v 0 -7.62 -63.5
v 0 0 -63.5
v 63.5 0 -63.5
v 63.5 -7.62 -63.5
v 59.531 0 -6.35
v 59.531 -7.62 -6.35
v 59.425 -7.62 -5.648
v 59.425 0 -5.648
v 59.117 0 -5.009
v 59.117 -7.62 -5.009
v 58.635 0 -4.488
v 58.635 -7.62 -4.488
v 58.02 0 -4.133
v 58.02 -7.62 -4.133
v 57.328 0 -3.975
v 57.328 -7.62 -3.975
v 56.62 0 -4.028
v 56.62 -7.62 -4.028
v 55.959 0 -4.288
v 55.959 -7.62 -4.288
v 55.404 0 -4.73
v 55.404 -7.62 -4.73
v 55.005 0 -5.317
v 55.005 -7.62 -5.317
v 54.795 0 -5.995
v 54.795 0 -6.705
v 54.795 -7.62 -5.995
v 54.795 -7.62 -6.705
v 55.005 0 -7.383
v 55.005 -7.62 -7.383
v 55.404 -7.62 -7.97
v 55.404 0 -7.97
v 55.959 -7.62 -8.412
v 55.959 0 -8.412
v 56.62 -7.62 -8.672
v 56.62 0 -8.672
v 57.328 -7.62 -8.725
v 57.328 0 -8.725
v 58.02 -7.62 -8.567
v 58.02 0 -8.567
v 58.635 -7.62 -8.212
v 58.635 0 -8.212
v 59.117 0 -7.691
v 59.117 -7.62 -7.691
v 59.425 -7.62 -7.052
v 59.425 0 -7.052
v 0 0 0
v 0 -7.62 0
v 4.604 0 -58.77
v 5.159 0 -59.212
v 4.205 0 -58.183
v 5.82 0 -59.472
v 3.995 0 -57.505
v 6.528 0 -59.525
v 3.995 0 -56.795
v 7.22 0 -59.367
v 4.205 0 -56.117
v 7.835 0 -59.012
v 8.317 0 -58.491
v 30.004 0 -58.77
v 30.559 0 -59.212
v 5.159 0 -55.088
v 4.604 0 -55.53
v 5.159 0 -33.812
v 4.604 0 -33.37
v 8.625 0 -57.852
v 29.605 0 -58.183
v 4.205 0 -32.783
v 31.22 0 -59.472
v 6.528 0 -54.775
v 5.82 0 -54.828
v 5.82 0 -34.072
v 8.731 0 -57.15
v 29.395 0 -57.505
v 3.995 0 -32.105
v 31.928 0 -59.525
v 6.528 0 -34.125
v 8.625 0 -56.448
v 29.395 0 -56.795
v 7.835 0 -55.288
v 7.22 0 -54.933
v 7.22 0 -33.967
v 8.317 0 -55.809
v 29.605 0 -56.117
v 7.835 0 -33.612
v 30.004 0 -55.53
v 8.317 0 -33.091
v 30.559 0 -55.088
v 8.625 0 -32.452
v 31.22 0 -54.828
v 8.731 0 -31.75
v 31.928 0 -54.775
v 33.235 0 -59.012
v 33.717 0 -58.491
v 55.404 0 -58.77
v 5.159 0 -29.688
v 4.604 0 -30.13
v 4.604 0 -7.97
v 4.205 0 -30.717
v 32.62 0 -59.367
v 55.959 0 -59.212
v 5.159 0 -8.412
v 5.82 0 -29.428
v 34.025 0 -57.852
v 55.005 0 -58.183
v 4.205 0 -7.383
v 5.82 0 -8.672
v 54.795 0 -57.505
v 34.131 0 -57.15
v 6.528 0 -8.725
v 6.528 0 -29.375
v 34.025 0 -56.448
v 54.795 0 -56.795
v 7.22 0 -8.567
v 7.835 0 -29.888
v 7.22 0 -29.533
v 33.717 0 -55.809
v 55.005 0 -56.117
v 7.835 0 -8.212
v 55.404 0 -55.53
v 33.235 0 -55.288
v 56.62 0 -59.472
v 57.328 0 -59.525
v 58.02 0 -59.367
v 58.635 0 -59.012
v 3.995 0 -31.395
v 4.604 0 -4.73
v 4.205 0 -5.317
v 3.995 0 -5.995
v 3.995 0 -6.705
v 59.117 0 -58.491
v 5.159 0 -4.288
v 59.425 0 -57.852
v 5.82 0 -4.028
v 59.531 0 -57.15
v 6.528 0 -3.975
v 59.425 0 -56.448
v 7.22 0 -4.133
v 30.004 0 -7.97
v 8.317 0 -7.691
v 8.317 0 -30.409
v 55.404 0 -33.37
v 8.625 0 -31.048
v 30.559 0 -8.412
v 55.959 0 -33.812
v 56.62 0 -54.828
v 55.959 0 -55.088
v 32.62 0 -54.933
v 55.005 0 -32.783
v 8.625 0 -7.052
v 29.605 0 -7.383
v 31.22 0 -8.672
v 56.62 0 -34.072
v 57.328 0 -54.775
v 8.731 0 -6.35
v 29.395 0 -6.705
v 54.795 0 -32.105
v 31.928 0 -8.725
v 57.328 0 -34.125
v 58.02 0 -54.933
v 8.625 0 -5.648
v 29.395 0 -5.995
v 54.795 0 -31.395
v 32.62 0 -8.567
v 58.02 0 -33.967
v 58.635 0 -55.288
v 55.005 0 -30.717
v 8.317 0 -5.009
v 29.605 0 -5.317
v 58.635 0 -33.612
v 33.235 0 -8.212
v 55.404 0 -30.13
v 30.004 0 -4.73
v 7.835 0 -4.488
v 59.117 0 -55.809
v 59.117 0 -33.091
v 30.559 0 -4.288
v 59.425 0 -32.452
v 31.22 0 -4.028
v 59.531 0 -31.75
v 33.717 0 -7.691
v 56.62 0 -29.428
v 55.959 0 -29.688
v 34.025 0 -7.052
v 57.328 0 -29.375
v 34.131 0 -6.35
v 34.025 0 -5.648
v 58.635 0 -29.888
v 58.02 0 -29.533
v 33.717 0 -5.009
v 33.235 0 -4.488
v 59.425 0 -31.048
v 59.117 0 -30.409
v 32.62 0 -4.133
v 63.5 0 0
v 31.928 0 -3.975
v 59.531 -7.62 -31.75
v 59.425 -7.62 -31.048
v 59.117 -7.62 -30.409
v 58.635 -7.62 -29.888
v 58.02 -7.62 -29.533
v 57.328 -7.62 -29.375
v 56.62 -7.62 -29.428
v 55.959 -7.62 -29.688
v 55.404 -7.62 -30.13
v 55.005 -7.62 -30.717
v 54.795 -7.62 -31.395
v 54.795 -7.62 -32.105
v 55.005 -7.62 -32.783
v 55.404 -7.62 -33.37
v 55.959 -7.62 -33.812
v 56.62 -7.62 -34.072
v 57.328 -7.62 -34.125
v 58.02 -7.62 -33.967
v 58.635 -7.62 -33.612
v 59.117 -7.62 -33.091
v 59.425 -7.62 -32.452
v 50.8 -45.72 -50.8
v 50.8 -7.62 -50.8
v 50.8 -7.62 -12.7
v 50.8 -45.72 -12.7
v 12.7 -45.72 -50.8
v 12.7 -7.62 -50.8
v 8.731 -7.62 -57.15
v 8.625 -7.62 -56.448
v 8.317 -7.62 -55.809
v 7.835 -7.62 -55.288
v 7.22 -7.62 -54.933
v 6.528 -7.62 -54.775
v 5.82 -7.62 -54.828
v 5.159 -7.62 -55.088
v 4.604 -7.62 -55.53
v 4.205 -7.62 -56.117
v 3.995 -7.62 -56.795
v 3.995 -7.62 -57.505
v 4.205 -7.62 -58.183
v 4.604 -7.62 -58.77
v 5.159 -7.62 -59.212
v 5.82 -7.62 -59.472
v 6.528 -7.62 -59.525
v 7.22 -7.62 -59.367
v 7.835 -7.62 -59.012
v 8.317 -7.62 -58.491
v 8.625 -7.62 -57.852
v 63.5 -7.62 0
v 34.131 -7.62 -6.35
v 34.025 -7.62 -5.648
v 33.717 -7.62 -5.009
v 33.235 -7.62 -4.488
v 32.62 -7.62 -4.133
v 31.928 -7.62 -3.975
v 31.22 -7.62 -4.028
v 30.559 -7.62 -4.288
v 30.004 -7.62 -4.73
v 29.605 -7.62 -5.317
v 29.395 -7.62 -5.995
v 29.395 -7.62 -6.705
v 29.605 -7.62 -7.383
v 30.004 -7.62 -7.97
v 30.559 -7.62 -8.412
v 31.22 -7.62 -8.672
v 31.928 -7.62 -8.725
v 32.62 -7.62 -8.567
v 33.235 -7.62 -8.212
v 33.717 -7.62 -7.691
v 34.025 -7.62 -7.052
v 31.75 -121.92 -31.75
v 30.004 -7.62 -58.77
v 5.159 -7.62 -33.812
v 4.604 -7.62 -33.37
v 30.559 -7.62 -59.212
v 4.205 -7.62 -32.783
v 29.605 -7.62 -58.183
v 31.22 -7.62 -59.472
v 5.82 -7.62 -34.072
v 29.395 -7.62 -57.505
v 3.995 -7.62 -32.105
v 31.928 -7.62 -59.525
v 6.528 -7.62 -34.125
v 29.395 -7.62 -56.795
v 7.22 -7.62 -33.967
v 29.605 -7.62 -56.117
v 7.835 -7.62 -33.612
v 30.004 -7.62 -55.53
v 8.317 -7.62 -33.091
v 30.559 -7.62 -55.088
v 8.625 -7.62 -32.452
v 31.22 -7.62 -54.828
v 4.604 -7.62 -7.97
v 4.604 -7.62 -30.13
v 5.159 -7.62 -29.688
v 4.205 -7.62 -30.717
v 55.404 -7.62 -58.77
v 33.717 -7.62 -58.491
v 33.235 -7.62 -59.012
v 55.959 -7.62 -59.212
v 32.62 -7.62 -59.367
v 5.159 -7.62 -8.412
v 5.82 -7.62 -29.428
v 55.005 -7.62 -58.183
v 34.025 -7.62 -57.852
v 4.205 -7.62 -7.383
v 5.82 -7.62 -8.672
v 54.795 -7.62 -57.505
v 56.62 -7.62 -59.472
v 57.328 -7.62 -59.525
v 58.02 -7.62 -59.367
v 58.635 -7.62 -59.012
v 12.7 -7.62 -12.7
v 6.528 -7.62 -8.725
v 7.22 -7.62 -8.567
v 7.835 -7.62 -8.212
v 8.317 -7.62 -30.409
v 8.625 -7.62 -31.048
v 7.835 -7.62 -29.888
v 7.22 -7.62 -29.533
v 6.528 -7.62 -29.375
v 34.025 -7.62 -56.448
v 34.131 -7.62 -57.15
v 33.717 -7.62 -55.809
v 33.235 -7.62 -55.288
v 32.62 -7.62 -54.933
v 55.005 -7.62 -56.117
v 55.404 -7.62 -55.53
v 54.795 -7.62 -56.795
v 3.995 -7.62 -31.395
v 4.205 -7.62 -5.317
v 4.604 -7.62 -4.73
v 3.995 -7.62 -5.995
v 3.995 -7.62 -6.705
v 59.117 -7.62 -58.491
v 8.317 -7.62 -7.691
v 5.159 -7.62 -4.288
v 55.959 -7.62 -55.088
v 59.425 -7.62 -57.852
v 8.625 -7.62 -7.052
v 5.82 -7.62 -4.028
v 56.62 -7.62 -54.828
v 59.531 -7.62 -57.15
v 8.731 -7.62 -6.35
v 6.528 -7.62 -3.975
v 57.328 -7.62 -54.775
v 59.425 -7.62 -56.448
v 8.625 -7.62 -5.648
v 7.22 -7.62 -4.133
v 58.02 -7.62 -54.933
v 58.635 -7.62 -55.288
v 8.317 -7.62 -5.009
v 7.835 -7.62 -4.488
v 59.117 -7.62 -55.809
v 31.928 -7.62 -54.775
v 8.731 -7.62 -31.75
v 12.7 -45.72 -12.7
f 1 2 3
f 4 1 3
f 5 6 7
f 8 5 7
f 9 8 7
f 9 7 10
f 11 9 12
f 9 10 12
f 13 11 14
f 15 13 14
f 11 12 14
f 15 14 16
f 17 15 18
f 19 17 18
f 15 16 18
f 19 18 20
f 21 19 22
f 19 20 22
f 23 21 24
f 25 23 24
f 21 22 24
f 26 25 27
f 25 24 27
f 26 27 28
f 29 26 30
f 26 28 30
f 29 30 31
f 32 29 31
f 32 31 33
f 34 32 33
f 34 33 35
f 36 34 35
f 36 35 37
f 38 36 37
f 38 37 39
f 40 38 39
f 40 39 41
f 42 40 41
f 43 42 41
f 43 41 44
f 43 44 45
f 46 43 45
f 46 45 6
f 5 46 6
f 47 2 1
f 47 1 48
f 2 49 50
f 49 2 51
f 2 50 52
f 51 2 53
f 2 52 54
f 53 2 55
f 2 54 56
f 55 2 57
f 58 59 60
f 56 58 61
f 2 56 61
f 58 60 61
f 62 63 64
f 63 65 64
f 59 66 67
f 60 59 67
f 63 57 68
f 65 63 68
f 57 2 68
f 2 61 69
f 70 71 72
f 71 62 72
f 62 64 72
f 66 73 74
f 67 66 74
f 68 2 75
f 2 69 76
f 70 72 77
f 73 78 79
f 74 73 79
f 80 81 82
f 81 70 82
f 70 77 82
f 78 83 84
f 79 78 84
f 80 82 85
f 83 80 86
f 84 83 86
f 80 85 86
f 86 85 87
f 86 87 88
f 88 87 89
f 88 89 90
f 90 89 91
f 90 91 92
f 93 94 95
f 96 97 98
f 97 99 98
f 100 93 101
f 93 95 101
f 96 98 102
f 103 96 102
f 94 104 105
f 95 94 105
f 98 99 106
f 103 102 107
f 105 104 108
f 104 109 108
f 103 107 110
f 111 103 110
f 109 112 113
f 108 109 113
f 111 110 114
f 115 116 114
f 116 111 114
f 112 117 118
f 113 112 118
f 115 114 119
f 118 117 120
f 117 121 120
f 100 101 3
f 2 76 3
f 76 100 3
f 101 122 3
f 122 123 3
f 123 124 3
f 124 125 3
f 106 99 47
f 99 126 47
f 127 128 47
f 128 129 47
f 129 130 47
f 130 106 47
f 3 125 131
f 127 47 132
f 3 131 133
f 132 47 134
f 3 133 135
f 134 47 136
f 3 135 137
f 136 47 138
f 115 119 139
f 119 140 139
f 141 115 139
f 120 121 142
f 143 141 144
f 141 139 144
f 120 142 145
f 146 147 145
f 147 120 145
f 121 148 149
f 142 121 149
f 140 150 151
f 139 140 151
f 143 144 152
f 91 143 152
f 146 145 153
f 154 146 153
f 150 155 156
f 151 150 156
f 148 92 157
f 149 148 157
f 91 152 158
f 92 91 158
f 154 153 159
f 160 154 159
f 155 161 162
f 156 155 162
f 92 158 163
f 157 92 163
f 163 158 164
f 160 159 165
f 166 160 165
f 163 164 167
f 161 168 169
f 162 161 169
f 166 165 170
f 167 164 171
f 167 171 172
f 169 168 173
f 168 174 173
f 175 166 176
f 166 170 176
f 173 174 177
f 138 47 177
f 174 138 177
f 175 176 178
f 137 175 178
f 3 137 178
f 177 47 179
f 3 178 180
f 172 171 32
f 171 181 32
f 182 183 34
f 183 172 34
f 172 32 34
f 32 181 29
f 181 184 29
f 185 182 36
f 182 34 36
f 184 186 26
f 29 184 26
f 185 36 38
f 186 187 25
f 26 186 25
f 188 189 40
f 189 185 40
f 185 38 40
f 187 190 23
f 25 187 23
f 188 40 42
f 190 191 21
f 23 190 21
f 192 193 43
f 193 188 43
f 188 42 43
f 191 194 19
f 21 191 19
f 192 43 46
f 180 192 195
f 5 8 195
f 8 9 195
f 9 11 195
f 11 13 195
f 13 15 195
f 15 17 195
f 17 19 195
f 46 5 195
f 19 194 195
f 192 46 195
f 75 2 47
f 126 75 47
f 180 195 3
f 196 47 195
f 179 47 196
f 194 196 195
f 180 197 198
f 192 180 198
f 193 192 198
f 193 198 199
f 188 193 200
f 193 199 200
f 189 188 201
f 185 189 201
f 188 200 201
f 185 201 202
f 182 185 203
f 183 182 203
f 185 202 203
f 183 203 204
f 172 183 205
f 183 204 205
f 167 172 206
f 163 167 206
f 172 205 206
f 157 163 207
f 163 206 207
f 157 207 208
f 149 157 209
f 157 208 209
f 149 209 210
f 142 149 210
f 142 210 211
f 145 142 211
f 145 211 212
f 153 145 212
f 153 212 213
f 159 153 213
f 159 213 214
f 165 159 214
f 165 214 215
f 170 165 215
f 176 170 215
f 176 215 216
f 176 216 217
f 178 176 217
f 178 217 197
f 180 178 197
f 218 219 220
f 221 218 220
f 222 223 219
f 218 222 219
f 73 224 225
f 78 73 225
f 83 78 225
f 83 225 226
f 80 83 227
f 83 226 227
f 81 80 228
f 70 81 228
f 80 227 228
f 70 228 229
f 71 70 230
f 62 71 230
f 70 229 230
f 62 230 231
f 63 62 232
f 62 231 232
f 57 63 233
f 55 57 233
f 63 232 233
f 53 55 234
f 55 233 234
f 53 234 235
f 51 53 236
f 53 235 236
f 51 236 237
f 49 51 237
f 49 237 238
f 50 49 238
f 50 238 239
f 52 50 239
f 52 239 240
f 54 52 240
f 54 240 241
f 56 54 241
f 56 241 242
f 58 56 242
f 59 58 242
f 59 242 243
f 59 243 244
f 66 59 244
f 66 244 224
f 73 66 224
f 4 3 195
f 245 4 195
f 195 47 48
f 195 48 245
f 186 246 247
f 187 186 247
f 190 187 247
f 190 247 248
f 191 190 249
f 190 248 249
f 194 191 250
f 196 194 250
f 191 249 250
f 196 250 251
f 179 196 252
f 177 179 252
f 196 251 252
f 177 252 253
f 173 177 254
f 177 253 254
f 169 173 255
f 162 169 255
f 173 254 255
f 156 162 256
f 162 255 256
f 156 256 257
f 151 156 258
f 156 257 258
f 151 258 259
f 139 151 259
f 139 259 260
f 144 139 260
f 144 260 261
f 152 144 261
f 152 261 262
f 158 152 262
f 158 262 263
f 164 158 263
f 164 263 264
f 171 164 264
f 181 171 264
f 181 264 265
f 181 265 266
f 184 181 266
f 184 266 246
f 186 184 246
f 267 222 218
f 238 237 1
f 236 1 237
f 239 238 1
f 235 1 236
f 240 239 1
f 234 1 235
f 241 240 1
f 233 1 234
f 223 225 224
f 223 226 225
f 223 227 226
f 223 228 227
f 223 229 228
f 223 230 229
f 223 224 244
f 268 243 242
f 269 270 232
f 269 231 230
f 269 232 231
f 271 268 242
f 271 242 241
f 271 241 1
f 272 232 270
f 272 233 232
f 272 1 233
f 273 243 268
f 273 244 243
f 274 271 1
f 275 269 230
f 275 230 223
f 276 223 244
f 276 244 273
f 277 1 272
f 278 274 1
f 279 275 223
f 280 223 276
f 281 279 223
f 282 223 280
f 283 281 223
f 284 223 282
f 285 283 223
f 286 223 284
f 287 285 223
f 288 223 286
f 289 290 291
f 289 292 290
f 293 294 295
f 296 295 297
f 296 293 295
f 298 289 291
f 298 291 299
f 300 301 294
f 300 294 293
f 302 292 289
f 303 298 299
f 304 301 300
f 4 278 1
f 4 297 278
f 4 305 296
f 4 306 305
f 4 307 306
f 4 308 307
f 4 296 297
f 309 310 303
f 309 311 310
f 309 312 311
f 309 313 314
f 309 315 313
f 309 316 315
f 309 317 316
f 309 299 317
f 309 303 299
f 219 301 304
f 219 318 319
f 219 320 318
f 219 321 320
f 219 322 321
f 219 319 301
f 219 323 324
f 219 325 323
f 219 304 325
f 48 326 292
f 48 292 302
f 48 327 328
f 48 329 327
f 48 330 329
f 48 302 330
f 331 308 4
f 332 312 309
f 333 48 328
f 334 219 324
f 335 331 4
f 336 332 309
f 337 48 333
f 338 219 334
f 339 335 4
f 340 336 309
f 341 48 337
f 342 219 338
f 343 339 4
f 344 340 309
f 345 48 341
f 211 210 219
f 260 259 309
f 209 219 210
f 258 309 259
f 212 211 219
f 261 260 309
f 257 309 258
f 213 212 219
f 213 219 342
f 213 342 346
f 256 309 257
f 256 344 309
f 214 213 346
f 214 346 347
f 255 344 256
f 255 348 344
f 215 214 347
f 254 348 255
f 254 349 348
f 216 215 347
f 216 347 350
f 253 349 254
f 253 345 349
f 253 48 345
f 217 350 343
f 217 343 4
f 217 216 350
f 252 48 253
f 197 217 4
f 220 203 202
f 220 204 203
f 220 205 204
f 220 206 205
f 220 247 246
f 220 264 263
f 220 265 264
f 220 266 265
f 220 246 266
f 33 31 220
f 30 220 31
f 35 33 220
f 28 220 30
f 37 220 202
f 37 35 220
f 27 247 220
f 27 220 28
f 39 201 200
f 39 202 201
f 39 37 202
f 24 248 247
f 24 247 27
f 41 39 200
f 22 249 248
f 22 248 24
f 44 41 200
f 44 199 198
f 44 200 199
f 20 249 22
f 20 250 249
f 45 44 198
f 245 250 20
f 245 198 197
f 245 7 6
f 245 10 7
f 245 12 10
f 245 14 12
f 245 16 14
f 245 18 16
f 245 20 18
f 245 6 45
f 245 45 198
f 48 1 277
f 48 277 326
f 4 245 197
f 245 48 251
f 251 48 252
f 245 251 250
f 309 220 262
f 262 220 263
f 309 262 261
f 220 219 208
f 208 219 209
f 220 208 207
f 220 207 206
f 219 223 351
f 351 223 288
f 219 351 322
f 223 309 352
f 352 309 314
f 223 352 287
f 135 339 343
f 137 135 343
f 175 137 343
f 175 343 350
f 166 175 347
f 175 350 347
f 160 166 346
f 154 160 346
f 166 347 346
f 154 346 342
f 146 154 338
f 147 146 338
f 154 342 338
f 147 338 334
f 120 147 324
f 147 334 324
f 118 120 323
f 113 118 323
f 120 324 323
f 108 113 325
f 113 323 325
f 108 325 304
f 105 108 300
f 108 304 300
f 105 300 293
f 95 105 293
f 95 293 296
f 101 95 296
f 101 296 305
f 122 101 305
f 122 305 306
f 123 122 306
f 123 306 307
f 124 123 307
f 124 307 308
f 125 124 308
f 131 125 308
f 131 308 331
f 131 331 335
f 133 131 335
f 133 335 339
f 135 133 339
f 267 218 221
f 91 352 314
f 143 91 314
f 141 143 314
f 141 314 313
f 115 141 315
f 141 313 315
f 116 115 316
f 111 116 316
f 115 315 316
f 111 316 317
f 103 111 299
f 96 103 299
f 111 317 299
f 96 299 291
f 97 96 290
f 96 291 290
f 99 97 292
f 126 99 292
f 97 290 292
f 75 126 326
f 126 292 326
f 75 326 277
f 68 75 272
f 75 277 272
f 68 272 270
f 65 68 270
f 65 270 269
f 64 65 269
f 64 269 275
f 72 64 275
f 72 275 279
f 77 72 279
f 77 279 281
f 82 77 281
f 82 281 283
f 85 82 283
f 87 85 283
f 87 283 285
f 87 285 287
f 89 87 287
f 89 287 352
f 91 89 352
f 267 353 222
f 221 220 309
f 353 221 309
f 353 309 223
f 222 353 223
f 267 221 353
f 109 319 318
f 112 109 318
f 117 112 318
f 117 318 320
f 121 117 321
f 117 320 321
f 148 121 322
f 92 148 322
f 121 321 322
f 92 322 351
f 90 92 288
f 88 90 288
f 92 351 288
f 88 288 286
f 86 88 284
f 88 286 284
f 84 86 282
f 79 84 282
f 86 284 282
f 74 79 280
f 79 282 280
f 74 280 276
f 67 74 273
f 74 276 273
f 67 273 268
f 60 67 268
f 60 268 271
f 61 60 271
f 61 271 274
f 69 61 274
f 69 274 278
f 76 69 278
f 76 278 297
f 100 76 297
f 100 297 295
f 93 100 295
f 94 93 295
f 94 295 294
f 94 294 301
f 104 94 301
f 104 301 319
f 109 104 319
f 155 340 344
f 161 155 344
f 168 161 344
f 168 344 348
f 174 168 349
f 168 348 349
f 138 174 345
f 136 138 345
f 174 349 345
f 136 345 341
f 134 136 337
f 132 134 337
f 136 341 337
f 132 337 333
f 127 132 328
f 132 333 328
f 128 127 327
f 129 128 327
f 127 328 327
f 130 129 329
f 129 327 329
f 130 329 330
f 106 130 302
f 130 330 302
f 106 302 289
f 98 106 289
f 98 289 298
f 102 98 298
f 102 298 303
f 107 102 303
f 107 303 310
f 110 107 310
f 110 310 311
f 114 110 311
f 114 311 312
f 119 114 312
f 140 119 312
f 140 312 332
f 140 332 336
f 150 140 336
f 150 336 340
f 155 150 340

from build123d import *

# Parameters (mm, degrees)
F0_W     = 63.5
F0_H     = 63.5
F1_DEPTH = 7.62
F3_DEPTH = 114.3
F4_SIZE2 = 19.04999
F4_SIZE  = 76.19999
F5_R     = 2.38125
F7_DEPTH = 25.4
F9_DEPTH = 25.4


# Not quite as in the source:
# - a fillet or chamfer is up to 0.001 mm smaller than in the source, because OpenCascade refuses the exact size


with BuildPart() as f1:
    # F0 (on Front) → F1 (new body)
    with BuildSketch(Plane.XZ):
        with Locations((31.75, -31.75)):
            Rectangle(F0_W, F0_H)
    extrude(amount=F1_DEPTH)

    # F2 (on face) → F3 (join)
    with BuildSketch(Plane.XZ.offset(7.62)):
        Polygon((50.8, -12.7), (31.75, -12.7), (12.7, -12.7), (12.7, -50.8), (50.8, -50.8), align=None)
    extrude(amount=F3_DEPTH)

    # F4 (size 76.2 and 19.05 in the source; OpenCascade refuses exactly that, so slightly less here)
    f4_edges = [f1.edges().sort_by_distance(p)[0] for p in [
        (31.75, -121.92, -12.7),
        (12.7, -121.92, -31.75),
        (31.75, -121.92, -50.8),
        (50.8, -121.92, -31.75),
    ]]
    chamfer(f4_edges, length=F4_SIZE, length2=F4_SIZE2)

    # F5 (on face) → F7 (cut)
    with BuildSketch(Plane.XZ.offset(7.62)):
        with Locations((6.35, -6.35)):
            Circle(F5_R)
    extrude(amount=-F7_DEPTH, mode=Mode.SUBTRACT)

    # F5 (on face) → F9 (cut)
    with BuildSketch(Plane.XZ.offset(7.62)):
        with Locations((6.35, -31.75)):
            Circle(F5_R)
        with Locations((6.35, -57.15)):
            Circle(F5_R)
        with Locations((31.75, -57.15)):
            Circle(F5_R)
        with Locations((57.15, -57.15)):
            Circle(F5_R)
        with Locations((57.15, -31.75)):
            Circle(F5_R)
        with Locations((57.15, -6.35)):
            Circle(F5_R)
        with Locations((31.75, -6.35)):
            Circle(F5_R)
    extrude(amount=-F9_DEPTH, mode=Mode.SUBTRACT)


solid = f1.part
